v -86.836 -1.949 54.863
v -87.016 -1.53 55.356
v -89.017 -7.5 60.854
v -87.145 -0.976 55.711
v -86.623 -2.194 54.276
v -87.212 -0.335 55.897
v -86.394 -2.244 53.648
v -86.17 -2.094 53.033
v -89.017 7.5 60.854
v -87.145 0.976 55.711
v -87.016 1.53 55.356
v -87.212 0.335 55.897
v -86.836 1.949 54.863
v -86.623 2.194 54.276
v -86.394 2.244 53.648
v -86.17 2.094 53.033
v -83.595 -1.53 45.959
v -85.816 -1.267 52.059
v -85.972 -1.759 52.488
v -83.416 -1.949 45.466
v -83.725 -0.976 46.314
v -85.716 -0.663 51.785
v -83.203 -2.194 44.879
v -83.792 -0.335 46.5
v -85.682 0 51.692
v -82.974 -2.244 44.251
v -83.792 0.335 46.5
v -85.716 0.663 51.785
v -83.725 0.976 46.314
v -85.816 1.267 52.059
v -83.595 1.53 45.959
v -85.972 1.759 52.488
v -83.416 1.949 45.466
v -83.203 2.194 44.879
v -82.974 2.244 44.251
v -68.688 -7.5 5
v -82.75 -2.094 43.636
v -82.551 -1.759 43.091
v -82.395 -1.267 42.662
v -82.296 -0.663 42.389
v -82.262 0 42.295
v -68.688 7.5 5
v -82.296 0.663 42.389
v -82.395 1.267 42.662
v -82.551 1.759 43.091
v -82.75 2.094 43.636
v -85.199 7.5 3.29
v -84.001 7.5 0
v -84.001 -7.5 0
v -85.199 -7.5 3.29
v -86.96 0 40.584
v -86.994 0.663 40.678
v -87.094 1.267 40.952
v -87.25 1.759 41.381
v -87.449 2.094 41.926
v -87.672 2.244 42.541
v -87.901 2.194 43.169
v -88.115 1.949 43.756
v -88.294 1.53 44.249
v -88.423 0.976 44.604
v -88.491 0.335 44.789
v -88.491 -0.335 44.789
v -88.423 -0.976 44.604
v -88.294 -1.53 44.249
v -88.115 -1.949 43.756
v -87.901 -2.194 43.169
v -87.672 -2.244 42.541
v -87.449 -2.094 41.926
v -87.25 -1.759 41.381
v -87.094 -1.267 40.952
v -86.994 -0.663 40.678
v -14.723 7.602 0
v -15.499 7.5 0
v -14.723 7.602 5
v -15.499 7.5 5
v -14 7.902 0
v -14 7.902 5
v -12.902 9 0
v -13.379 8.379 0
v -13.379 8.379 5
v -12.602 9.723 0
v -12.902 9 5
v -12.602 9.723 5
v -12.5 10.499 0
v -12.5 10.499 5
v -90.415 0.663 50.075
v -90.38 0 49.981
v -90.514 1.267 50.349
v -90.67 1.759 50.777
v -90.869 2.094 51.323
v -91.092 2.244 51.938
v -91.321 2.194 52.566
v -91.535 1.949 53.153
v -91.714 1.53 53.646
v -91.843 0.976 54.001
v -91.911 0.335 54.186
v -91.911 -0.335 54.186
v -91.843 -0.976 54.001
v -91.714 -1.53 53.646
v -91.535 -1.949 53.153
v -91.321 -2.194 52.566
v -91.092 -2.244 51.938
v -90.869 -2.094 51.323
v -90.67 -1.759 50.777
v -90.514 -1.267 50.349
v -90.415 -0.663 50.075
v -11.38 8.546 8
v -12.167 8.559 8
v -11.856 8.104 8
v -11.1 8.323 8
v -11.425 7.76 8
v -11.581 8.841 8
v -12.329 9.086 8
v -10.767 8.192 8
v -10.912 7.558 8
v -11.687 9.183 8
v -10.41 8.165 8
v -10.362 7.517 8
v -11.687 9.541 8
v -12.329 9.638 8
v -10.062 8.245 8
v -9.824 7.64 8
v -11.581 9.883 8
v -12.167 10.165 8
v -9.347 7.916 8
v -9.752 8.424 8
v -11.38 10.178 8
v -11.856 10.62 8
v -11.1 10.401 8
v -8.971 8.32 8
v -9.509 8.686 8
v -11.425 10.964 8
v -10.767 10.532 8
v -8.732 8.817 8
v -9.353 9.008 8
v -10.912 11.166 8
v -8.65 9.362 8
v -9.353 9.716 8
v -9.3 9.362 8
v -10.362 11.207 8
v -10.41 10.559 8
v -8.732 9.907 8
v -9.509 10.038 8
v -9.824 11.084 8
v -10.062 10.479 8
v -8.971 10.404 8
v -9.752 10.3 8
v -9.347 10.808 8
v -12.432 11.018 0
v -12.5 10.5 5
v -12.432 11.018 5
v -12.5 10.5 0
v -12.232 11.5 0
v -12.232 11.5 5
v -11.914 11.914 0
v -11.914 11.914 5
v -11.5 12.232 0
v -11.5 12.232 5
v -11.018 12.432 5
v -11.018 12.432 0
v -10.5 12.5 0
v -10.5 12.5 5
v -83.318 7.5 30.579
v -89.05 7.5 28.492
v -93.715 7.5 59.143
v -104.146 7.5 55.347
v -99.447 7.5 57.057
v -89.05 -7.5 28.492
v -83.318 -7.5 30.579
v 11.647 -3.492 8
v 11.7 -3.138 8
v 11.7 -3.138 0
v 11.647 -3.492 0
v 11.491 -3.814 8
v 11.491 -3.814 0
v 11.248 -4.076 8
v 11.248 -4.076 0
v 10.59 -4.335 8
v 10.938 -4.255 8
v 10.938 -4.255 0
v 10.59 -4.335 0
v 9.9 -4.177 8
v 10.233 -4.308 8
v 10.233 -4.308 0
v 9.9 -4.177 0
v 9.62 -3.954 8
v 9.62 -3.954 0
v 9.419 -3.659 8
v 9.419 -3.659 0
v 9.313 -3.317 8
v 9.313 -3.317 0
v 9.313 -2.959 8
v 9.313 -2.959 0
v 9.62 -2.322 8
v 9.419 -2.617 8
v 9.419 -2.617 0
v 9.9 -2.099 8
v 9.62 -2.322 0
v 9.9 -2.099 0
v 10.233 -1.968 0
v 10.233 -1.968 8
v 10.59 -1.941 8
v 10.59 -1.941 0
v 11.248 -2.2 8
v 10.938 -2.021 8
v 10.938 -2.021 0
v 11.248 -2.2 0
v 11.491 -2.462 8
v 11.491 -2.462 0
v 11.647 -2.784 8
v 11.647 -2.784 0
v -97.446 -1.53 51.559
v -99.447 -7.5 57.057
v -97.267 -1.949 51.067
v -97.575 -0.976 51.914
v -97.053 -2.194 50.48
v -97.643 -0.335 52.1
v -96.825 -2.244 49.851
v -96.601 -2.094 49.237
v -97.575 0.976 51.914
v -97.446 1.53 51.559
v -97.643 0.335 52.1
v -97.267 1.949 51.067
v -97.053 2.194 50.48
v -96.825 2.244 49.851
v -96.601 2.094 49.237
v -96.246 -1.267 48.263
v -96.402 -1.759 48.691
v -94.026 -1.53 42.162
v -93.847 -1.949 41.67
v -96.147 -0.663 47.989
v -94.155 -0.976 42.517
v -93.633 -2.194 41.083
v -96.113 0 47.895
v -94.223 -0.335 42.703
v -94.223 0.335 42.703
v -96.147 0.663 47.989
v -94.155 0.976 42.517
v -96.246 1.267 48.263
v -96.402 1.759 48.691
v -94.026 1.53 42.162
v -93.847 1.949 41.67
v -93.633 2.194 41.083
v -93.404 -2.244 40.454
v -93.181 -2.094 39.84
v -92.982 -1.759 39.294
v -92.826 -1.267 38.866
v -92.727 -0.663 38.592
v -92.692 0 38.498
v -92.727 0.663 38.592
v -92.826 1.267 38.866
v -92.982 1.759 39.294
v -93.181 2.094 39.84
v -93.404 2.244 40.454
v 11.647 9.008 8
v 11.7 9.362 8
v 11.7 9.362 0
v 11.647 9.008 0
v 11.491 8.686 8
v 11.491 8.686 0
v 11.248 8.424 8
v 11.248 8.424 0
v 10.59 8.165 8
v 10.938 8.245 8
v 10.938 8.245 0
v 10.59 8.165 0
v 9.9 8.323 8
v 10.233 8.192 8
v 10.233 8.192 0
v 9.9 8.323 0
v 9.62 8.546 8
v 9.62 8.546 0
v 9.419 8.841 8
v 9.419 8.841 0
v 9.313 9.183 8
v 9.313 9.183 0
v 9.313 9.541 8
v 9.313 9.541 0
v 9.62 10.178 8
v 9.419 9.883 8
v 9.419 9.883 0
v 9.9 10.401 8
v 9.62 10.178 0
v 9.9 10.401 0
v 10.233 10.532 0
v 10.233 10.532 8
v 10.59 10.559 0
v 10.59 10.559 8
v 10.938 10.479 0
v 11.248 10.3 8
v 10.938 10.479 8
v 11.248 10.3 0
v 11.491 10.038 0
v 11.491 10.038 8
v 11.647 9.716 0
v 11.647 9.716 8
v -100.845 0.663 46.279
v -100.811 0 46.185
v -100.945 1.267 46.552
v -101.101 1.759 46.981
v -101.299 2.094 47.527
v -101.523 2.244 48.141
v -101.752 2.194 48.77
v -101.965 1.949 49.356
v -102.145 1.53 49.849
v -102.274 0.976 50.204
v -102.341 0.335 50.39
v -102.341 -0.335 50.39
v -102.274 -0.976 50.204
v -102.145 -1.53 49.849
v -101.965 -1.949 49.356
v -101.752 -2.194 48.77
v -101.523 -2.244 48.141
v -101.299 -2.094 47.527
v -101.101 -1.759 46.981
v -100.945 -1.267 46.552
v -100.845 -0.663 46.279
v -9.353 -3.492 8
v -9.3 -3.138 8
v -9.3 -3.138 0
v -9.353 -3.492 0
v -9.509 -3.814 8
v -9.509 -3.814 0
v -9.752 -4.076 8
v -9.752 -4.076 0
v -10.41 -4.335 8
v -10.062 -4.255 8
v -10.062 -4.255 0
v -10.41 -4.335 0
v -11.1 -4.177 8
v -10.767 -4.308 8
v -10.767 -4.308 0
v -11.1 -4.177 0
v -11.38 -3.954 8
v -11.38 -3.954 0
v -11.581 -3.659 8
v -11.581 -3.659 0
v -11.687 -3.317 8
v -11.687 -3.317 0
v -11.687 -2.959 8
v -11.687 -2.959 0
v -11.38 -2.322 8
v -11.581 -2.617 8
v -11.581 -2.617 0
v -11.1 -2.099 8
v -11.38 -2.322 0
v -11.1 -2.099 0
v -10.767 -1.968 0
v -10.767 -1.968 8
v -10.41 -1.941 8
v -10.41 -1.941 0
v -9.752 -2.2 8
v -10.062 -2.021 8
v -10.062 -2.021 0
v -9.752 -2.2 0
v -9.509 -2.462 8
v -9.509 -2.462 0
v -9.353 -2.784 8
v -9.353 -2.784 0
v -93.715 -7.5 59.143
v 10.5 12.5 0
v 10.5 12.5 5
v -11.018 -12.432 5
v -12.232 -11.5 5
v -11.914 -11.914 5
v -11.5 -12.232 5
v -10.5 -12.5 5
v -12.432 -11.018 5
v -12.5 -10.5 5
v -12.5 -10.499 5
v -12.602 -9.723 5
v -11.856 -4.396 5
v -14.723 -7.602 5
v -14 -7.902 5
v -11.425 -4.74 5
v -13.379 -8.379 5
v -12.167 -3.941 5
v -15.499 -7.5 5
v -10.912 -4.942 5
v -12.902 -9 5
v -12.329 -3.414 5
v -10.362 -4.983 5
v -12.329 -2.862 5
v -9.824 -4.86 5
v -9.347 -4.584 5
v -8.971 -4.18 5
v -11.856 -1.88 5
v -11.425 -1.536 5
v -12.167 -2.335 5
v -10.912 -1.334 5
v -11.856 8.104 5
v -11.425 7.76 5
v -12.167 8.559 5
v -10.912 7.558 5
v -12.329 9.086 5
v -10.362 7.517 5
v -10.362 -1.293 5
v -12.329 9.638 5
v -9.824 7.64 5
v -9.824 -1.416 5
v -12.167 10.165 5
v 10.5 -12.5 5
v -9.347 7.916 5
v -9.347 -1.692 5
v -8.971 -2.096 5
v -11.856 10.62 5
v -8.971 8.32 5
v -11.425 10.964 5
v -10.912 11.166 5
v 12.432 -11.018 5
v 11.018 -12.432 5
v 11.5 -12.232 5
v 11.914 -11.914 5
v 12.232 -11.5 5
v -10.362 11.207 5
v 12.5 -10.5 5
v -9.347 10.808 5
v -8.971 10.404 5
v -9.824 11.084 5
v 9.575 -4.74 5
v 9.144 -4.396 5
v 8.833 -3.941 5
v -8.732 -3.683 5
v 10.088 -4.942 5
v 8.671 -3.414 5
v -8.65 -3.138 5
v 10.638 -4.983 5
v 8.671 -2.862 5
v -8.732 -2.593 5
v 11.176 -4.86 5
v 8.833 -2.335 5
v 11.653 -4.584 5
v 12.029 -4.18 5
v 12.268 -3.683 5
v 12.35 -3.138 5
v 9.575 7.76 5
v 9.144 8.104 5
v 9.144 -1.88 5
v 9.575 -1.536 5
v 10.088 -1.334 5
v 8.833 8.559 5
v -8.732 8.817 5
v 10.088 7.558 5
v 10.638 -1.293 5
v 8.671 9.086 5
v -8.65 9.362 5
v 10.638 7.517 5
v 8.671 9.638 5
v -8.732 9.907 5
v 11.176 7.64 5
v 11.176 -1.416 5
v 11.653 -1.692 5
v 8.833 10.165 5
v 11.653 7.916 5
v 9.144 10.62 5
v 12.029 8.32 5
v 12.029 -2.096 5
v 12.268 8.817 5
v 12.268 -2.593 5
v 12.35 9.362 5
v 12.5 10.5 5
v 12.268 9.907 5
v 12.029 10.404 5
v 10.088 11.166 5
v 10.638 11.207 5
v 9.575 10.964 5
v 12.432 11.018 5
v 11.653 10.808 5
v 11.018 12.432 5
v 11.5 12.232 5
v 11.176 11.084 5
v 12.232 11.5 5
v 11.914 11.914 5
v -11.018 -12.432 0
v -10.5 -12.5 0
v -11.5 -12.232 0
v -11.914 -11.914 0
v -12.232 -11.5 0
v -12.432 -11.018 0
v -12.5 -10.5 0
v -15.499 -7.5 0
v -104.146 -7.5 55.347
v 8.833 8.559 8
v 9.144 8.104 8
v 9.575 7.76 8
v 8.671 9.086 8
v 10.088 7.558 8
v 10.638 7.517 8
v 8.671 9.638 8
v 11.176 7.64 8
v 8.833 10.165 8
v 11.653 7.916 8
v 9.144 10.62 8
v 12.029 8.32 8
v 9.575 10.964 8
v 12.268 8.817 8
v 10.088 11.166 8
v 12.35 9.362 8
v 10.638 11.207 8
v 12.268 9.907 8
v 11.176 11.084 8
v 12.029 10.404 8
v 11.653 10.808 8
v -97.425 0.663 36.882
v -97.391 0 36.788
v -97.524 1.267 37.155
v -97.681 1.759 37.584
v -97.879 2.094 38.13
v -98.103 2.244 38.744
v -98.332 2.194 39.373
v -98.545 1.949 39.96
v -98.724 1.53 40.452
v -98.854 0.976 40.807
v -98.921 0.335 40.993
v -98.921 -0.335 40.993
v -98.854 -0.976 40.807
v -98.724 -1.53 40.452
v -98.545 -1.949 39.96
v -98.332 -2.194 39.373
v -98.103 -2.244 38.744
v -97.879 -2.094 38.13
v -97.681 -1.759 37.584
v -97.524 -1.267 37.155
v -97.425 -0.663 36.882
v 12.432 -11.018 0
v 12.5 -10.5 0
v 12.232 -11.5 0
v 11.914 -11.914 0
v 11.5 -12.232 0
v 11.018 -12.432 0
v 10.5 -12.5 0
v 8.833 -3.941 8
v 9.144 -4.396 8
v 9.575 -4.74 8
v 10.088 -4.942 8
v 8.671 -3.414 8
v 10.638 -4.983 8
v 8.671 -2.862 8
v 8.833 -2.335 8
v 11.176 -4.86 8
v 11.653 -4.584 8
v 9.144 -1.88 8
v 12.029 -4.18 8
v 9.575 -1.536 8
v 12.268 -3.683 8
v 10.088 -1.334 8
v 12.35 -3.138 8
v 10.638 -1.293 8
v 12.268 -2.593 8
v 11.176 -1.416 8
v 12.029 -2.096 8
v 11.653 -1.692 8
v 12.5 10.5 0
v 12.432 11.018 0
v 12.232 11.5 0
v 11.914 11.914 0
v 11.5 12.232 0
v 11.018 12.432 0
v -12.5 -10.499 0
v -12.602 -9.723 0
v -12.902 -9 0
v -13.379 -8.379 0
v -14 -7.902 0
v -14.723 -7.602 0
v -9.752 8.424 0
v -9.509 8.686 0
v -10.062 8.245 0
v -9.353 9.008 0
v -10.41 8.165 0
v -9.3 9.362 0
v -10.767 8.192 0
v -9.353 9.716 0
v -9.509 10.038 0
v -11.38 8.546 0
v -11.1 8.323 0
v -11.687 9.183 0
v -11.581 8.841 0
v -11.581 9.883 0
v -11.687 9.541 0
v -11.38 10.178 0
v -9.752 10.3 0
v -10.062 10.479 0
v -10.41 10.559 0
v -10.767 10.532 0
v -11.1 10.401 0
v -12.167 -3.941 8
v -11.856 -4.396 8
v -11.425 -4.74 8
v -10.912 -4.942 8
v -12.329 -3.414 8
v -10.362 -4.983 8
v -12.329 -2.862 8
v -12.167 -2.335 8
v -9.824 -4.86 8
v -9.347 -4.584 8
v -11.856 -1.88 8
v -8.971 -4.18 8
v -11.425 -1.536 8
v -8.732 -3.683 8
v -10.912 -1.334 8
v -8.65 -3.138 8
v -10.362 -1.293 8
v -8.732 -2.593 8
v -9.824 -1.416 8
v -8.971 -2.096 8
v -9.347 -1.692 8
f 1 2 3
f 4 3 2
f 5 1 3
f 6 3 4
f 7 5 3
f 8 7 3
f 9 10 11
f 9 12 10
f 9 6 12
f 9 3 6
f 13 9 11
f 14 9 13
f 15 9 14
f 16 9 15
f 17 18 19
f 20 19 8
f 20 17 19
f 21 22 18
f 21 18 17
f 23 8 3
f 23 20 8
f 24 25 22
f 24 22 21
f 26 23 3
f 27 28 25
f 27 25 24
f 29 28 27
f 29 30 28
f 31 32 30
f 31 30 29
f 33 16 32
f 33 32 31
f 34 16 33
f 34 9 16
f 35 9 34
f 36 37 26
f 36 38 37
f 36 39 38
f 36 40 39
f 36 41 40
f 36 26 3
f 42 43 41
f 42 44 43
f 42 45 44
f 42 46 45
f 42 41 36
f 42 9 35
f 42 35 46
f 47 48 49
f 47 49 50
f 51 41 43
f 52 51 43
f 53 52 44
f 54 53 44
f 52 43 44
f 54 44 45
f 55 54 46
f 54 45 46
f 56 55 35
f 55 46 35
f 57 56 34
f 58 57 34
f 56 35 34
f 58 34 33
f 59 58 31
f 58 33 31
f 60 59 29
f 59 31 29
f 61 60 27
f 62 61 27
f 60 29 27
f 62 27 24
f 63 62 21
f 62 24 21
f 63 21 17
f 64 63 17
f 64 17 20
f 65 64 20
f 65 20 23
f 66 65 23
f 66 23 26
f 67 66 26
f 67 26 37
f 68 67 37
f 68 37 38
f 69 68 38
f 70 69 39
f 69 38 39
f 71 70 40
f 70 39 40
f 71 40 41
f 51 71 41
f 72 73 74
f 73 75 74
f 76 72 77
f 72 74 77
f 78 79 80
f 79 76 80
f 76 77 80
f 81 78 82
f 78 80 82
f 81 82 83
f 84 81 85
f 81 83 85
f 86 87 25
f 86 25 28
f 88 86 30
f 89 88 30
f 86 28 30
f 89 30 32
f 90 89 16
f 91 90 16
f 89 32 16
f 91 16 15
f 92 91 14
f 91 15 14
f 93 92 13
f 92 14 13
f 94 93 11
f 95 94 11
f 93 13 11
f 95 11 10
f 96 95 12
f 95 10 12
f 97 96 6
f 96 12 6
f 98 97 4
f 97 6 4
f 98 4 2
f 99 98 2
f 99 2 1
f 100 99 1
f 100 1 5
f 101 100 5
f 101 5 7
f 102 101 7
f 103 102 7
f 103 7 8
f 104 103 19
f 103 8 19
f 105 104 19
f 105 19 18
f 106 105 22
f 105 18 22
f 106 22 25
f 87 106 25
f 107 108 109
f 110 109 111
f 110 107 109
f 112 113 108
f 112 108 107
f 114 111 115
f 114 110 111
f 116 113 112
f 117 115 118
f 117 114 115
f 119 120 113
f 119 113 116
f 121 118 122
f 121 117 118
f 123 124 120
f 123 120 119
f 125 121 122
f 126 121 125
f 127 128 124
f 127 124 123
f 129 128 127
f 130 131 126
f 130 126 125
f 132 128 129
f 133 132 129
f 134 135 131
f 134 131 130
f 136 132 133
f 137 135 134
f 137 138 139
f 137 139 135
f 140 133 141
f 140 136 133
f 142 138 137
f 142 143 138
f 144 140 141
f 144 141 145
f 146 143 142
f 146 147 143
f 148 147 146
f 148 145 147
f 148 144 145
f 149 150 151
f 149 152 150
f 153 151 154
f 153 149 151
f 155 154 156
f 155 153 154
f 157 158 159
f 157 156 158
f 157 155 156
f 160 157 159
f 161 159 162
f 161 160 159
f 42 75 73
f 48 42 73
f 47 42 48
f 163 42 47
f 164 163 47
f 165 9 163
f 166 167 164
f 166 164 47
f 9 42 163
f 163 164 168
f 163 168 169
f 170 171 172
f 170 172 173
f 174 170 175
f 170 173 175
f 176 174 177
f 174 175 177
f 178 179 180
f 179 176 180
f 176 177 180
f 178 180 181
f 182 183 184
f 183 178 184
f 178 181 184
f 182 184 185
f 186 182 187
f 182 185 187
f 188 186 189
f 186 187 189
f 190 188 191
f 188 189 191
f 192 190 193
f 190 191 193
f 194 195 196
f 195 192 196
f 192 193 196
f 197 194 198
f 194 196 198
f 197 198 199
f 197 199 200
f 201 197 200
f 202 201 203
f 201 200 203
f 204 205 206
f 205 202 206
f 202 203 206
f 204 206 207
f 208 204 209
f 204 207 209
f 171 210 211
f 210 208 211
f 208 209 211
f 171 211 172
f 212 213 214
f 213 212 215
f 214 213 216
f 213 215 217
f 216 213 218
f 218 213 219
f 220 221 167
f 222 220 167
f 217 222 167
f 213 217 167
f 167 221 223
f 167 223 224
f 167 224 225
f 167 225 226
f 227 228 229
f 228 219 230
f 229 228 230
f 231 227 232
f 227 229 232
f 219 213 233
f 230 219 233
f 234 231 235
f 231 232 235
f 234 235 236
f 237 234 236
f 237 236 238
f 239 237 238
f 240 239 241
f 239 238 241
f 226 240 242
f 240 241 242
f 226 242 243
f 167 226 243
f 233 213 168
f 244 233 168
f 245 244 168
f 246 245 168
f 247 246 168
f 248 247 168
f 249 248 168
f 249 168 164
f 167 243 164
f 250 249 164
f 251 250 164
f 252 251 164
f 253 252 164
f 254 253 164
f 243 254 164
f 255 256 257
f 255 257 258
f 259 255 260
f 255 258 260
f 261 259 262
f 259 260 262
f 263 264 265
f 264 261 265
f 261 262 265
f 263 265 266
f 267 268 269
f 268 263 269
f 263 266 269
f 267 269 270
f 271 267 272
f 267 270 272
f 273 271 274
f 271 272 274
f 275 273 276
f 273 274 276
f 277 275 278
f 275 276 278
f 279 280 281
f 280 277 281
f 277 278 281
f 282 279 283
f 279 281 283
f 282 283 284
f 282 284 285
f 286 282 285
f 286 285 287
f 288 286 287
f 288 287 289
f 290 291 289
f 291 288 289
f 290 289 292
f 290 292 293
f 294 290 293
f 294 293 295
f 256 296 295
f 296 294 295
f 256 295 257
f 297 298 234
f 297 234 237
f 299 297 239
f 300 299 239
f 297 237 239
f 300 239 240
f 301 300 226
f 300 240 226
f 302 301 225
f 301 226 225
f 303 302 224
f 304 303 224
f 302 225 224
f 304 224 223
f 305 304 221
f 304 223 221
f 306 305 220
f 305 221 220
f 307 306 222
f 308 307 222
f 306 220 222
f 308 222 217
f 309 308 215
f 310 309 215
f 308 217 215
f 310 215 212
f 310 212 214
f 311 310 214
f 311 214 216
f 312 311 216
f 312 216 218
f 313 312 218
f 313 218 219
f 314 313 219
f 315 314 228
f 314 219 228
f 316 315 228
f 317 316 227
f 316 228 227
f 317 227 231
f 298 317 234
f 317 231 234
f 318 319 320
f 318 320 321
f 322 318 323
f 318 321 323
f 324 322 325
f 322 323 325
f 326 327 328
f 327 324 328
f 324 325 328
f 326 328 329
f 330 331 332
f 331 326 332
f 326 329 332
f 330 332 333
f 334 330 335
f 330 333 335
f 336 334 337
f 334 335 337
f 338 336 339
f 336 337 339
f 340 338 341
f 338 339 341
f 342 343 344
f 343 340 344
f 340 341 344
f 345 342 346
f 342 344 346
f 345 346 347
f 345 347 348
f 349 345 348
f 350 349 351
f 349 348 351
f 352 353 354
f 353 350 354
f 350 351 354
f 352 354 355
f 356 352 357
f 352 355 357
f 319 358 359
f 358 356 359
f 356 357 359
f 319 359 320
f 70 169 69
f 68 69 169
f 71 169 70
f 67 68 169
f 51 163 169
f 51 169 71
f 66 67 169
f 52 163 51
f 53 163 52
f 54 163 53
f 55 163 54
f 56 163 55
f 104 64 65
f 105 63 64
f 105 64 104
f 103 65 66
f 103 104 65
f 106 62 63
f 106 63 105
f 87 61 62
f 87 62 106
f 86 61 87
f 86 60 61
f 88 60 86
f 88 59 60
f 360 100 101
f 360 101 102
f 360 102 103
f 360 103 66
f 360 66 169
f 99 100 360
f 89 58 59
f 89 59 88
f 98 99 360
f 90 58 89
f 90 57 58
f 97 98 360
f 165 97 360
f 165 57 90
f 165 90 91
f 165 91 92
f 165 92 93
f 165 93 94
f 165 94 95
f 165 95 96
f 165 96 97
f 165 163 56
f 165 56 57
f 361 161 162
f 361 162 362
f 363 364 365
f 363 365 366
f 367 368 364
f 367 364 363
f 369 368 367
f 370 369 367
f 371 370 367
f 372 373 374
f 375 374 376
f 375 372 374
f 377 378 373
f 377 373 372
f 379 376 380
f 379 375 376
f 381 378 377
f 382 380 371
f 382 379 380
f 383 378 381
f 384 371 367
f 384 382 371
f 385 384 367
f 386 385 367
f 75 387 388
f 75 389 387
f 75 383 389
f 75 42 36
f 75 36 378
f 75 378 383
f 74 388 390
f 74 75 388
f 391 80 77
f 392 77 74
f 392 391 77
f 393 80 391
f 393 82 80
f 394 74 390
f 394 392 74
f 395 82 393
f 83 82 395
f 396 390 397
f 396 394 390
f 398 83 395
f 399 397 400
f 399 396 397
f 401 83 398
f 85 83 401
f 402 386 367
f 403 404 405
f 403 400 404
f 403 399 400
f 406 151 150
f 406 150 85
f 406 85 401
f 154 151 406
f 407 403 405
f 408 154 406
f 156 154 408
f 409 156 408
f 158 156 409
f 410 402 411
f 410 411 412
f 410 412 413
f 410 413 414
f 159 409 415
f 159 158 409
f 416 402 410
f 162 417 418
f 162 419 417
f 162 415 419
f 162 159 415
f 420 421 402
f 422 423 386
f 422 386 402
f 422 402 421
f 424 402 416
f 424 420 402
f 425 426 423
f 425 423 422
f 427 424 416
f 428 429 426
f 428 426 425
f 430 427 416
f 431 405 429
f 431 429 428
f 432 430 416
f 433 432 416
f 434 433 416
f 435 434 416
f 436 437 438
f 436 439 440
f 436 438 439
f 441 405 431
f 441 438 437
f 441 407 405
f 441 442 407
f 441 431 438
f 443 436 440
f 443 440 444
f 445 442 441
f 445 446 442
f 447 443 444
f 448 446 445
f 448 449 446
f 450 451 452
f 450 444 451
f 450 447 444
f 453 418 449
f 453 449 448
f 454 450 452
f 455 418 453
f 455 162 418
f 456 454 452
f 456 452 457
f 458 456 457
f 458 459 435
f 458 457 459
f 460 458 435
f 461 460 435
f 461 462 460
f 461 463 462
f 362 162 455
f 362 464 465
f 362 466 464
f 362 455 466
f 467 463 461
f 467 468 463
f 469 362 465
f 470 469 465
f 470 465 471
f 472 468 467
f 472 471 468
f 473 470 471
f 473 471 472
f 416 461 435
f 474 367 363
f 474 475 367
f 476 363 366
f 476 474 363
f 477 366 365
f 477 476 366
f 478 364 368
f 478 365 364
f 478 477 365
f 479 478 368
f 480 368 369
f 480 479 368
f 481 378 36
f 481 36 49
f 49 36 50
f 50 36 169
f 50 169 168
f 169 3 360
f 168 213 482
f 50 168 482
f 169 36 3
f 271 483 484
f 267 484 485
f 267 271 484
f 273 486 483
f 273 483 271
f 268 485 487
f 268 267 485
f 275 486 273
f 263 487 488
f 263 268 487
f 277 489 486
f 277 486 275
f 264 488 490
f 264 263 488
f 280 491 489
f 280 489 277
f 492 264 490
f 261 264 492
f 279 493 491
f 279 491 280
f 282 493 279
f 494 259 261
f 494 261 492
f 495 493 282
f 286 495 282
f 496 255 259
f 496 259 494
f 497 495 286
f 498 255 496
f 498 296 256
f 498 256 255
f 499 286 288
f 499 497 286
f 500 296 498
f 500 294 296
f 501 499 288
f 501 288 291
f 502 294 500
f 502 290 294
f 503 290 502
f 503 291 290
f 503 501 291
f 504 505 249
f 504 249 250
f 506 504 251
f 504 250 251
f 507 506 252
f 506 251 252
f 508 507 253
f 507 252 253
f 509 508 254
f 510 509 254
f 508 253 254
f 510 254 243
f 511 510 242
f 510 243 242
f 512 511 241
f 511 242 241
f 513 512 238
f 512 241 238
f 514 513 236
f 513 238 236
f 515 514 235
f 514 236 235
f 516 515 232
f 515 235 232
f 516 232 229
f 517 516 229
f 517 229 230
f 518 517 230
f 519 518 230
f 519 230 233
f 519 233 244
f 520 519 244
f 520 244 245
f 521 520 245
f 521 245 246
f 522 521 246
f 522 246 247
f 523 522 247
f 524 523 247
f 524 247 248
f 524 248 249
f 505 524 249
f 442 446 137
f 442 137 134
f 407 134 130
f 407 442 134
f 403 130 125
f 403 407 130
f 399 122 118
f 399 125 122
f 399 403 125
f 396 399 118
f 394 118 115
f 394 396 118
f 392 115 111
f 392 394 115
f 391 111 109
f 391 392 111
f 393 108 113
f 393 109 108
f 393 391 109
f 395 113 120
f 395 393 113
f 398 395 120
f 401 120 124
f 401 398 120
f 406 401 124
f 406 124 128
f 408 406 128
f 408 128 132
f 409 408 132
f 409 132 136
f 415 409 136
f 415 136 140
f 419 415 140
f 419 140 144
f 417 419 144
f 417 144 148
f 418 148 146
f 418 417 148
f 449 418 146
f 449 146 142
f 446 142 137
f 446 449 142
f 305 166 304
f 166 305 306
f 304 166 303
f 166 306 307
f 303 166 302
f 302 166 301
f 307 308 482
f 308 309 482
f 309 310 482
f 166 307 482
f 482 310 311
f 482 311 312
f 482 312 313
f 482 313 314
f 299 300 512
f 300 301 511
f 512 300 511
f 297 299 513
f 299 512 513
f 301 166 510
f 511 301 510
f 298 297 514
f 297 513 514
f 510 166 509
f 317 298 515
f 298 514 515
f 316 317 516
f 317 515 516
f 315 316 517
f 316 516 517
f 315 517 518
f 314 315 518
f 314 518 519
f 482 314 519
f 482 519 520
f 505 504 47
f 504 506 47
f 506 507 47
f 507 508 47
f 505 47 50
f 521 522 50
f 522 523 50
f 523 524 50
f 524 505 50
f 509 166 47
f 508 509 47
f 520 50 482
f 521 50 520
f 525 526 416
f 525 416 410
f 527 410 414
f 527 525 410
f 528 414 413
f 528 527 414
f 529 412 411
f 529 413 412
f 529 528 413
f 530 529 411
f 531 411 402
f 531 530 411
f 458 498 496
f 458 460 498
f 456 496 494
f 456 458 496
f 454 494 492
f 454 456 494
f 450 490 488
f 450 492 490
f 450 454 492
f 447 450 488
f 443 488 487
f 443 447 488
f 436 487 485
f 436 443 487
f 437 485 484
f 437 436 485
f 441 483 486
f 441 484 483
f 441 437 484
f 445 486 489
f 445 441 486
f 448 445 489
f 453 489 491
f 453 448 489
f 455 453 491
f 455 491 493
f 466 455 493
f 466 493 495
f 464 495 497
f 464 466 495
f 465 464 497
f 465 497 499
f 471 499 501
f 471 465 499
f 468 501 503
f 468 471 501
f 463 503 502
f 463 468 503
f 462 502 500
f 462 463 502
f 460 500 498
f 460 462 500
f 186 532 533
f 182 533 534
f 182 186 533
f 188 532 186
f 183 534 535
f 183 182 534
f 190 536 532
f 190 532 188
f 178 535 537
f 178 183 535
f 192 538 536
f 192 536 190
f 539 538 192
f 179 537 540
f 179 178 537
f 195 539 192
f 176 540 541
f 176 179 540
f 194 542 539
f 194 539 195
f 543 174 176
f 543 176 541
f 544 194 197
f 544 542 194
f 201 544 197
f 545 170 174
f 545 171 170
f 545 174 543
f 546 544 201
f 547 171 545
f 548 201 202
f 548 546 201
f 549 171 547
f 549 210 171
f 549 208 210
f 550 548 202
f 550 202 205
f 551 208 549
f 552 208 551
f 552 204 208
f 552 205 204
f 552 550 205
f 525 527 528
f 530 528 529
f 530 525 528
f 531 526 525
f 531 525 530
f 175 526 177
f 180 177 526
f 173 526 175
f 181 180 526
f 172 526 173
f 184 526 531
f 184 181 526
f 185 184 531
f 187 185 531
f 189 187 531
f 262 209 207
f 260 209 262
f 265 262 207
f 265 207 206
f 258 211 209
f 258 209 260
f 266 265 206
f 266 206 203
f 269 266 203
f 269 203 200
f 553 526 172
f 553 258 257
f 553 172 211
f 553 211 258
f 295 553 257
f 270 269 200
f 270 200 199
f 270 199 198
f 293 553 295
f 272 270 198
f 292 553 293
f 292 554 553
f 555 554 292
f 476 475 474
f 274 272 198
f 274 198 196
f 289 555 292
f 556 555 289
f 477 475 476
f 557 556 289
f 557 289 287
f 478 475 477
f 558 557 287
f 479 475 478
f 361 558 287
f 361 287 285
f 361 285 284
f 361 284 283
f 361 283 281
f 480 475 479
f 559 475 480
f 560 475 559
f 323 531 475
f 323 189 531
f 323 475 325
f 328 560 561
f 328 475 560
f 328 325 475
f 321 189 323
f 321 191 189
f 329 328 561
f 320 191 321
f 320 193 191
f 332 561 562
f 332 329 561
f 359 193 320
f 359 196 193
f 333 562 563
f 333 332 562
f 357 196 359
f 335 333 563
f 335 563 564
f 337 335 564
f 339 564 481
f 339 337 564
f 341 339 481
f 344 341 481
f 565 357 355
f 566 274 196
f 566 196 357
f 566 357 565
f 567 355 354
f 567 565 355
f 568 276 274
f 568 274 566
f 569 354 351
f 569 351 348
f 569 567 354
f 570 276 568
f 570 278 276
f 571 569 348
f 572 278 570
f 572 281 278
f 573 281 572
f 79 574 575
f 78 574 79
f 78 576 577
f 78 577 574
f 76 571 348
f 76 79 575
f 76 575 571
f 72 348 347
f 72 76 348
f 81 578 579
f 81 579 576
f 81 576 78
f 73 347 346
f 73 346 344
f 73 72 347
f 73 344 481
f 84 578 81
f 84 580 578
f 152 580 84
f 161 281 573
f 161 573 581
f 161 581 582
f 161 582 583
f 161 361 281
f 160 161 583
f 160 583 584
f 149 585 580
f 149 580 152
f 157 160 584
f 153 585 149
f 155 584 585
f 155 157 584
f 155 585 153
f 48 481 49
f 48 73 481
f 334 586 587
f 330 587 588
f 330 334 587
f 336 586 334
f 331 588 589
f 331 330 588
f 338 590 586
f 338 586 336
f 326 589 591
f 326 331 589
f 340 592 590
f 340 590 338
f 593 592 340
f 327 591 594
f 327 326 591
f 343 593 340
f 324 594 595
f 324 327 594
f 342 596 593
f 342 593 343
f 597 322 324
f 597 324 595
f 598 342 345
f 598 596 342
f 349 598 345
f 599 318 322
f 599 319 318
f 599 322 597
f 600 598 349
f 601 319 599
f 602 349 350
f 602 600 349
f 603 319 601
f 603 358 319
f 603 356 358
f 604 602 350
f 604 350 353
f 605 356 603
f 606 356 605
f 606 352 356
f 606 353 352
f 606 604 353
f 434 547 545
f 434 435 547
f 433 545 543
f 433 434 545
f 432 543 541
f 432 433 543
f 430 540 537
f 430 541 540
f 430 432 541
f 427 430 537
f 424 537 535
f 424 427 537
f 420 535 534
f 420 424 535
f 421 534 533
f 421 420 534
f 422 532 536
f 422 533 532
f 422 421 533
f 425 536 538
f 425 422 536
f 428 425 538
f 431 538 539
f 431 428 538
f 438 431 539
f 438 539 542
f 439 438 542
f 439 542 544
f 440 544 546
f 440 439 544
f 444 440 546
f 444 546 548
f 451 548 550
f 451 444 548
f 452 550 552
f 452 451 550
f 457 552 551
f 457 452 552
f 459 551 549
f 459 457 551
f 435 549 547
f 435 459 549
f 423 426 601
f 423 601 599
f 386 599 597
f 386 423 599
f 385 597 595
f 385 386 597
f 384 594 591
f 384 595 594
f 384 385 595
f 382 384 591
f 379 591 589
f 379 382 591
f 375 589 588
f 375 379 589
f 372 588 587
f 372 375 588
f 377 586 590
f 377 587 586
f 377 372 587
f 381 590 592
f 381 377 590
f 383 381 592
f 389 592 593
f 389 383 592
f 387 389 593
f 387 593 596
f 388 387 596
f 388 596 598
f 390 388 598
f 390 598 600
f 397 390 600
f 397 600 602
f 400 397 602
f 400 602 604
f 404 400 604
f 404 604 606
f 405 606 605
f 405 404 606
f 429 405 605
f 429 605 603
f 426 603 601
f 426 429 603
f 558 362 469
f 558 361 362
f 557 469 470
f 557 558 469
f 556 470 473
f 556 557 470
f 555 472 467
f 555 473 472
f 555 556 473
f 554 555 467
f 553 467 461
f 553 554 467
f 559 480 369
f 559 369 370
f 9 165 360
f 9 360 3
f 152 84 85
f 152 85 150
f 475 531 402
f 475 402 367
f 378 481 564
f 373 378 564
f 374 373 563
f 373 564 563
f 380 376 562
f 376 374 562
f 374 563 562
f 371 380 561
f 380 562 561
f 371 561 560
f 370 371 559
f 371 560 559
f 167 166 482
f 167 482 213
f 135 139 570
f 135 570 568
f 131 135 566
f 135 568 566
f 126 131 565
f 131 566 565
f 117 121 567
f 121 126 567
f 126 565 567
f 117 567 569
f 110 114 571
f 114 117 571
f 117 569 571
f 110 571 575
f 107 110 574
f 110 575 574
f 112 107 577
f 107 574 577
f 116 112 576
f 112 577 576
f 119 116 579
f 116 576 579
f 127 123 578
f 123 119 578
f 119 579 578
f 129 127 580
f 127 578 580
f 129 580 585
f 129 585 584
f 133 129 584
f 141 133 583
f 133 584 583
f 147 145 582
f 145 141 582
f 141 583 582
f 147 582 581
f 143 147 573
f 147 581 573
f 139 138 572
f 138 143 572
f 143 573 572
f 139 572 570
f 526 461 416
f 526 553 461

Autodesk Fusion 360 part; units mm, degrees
sketch "Sketch1" plane through (0, 0, 0) normal (0, 0, 1) x (1, 0, 0)
  circle A0 centre (10.5, -3.138) radius 1.2
  line L0 (-10.5, 12.5) -> (10.5, 12.5)
  arc A1 (-12.5, -10.5) -> (-10.5, -12.5) centre (-10.5, -10.5) ccw
  circle A2 centre (-10.5, -3.138) radius 1.2
  arc A3 (10.5, -12.5) -> (12.5, -10.5) centre (10.5, -10.5) ccw
  circle A4 centre (-10.5, 9.362) radius 1.2
  arc A5 (-10.5, 12.5) -> (-12.5, 10.5) centre (-10.5, 10.5) ccw
  line L1 (-12.5, -10.5) -> (-12.5, 10.5)
  line L2 (12.5, 10.5) -> (12.5, -10.5)
  arc A6 (12.5, 10.5) -> (10.5, 12.5) centre (10.5, 10.5) ccw
  circle A7 centre (10.5, 9.362) radius 1.2
  line L3 (10.5, -12.5) -> (-10.5, -12.5)
  point P0 (-12.5, 12.5)
  point P1 (12.5, 12.5)
  point P2 (-12.5, -12.5)
  dimension "d1" = 25
  dimension "d2" = 25
  dimension "d3" = 2.4
  dimension "d4" = 2
  dimension "d5" = 2
  dimension "d6" = 2
  dimension "d7" = 2
  dimension "d8" = 2
  dimension "d9" = 2
  dimension "d10" = 2
  dimension "d11" = 12.5
  dimension "d12" = 12.5
  dimension "d13" = 21.862
  dimension "d14" = 21.862
  dimension "d15" = 9.362
  dimension "d16" = 9.362
  dimension "d17" = 12.5
  dimension "d18" = 12.5
extrude "Extrude1" add sketch "Sketch1" along normal blind 5
sketch "Sketch2" plane through (0, 0, 5) normal (0, 0, 1) x (1, 0, 0)
  circle A0 centre (-10.5, 9.362) radius 1.2
  circle A1 centre (10.5, -3.138) radius 1.2
  circle A2 centre (-10.5, -3.138) radius 1.2
  circle A3 centre (10.5, 9.362) radius 1.2
  arc A4 (12.5, 10.5) -> (10.5, 12.5) centre (10.5, 10.5) ccw
  line L0 (10.5, 12.5) -> (-10.5, 12.5)
  arc A5 (-10.5, 12.5) -> (-12.5, 10.5) centre (-10.5, 10.5) ccw
  line L1 (-12.5, 10.5) -> (-12.5, -10.5)
  arc A6 (-12.5, -10.5) -> (-10.5, -12.5) centre (-10.5, -10.5) ccw
  line L2 (-10.5, -12.5) -> (10.5, -12.5)
  arc A7 (10.5, -12.5) -> (12.5, -10.5) centre (10.5, -10.5) ccw
  line L3 (12.5, -10.5) -> (12.5, 10.5)
  circle A8 centre (-10.5, 9.362) radius 1.85
  circle A9 centre (10.5, 9.362) radius 1.85
  circle A10 centre (10.5, -3.138) radius 1.85
  circle A11 centre (-10.5, -3.138) radius 1.85
  dimension "d21" = 3.7
  dimension "d22" = 3.7
  dimension "d23" = 3.7
  dimension "d24" = 3.7
extrude "Extrude2" add sketch "Sketch2" along normal blind 3 contours A8 | A9 | A10 | A11
sketch "Sketch3" plane through (-12.5, 0, 0) normal (-1, 0, 0) x (0, 0, 1)
  line L0 (0, 10.5) -> (0, -10.5)
  line L1 (0, -10.5) -> (5, -10.5)
  line L2 (5, -10.5) -> (5, 10.5)
  line L3 (5, 10.5) -> (0, 10.5)
  line L4 (0, 7.5) -> (5, 7.5)
  line L5 (5, 7.5) -> (5, -7.5)
  line L6 (5, -7.5) -> (0, -7.5)
  line L7 (0, -7.5) -> (0, 7.5)
  dimension "d29" = 3
  dimension "d30" = 3
extrude "Extrude3" add sketch "Sketch3" along normal blind 68 contours L0 L2 L4 L5 L6 L7
fillet "Fillet1" radius 3 2 edges at (-12.5, 7.5, 2.5) (-12.5, -7.5, 2.5)
sketch "Sketch5" plane through (0, 7.5, 0) normal (0, 1, 0) x (-1, 0, 0)
  line L0 (15.5, 5) -> (15.5, 0)
  line L1 (15.5, 0) -> (80.5, 0)
  line L2 (80.5, 0) -> (80.5, 5)
  line L3 (80.5, 5) -> (15.5, 5)
  line L4 (80.5, 0) -> (94.2374, 0)
  line L5 (94.2374, 0) -> (80.5, 5)
  line L6 (84.001, 0) -> (85.1985, 3.2899)
  dimension "d38" = 20
  dimension "d39" = 5
  dimension "d40" = 5
extrude "Extrude5" add sketch "Sketch5" against normal up to surface (15 mm away) contours L2 L4 L5 L6
sketch "Sketch6" plane through (-11.0237, 0, 30.2873) normal (-0.342, 0, 0.9397) x (0.9397, 0, 0.342)
  line L0 (-78.9352, -7.5) -> (-73.9352, -7.5)
  line L1 (-73.9352, -7.5) -> (-73.9352, 7.5)
  line L2 (-73.9352, 7.5) -> (-78.9352, 7.5)
  line L3 (-78.9352, 7.5) -> (-78.9352, -7.5)
  line L4 (-78.9352, 7.5) -> (-73.9352, 7.5)
  line L5 (-73.9352, 7.5) -> (-73.9352, -7.5)
  line L6 (-73.9352, -7.5) -> (-78.9352, -7.5)
  line L7 (-78.9352, -7.5) -> (-78.9352, 7.5)
extrude "Extrude6" add sketch "Sketch6" along normal blind 55.398
sketch "Sketch7" plane through (-69.4763, 0, -25.2873) normal (0.9397, 0, 0.342) x (0.342, 0, -0.9397)
  line L0 (-32.2311, -7.5) -> (-32.2311, 7.5)
  line L1 (-32.2311, 7.5) -> (-87.6291, 7.5)
  line L2 (-87.6291, 7.5) -> (-87.6291, -7.5)
  line L3 (-87.6291, -7.5) -> (-32.2311, -7.5)
  line L4 (-87.6291, 0) -> (-32.2311, 0) construction
  circle A0 centre (-80.1291, 0) radius 2.25
  circle A1 centre (-70.1291, 0) radius 2.25
  dimension "d45" = 4.5
  dimension "d46" = 4.5
  dimension "d47" = 7.5
  dimension "d48" = 10
extrude "Extrude7" cut sketch "Sketch7" against normal up to surface (5 mm away) contours A0 | A1
sketch "Sketch8" plane through (0, 7.5, 0) normal (0, 1, 0) x (-1, 0, 0)
  line L0 (15.5, 5) -> (15.5, 0)
  line L1 (15.5, 0) -> (84.001, 0)
  line L2 (84.001, 0) -> (104.1457, 55.347)
  line L3 (104.1457, 55.347) -> (99.4472, 57.0571)
  line L4 (99.4472, 57.0571) -> (80.5, 5)
  line L5 (80.5, 5) -> (15.5, 5)
  line L6 (74.0085, 5) -> (93.7151, 59.1434)
  line L7 (93.7151, 59.1434) -> (89.0166, 60.8535)
  line L8 (89.0166, 60.8535) -> (68.6876, 5)
  line L9 (99.4472, 57.0571) -> (93.7151, 59.1434) construction
  dimension "d51" = 6.1
  dimension "d52" = 5
extrude "Extrude8" add sketch "Sketch8" against normal up to surface (15 mm away) contours L5 L6 L7 L8
sketch "Sketch9" plane through (-59.0457, 0, -21.4909) normal (0.9397, 0, 0.342) x (0.342, 0, -0.9397)
  line L0 (-87.6291, -7.5) -> (-28.191, -7.5)
  line L1 (-28.191, -7.5) -> (-28.191, 7.5)
  line L2 (-28.191, 7.5) -> (-87.6291, 7.5)
  line L3 (-87.6291, 7.5) -> (-87.6291, -7.5)
  circle A0 centre (-80.1291, 0) radius 2.25
  circle A1 centre (-70.1291, 0) radius 2.25
extrude "Extrude9" cut sketch "Sketch9" against normal up to surface (5 mm away) contours A0 | A1
sketch "Sketch10" plane through (0, 7.5, 0) normal (0, 1, 0) x (-1, 0, 0)
  line L0 (15.5, 5) -> (15.5, 0)
  line L1 (15.5, 0) -> (84.001, 0)
  line L2 (84.001, 0) -> (104.1457, 55.347)
  line L3 (104.1457, 55.347) -> (99.4472, 57.0571)
  line L4 (99.4472, 57.0571) -> (80.5, 5)
  line L5 (80.5, 5) -> (74.0085, 5)
  line L6 (74.0085, 5) -> (93.7151, 59.1434)
  line L7 (93.7151, 59.1434) -> (89.0166, 60.8535)
  line L8 (89.0166, 60.8535) -> (68.6876, 5)
  line L9 (68.6876, 5) -> (15.5, 5)
  line L10 (89.0505, 28.4923) -> (83.3184, 30.5786)
  dimension "d57" = 30.398
extrude "Extrude10" add sketch "Sketch10" against normal up to surface (15 mm away) contours L4 L5 L6 L10
equation "d17 = d11"
equation "d18 = d12"
equation "d22 = d21"
equation "d23 = d21"
equation "d24 = d21"
equation "d30 = d29"
equation "d40 = d39"
equation "d43 = 19.898 mm + 7.5 mm + 28 mm"
equation "d46 = d45"
equation "d57 = d43 - 25 mm"
